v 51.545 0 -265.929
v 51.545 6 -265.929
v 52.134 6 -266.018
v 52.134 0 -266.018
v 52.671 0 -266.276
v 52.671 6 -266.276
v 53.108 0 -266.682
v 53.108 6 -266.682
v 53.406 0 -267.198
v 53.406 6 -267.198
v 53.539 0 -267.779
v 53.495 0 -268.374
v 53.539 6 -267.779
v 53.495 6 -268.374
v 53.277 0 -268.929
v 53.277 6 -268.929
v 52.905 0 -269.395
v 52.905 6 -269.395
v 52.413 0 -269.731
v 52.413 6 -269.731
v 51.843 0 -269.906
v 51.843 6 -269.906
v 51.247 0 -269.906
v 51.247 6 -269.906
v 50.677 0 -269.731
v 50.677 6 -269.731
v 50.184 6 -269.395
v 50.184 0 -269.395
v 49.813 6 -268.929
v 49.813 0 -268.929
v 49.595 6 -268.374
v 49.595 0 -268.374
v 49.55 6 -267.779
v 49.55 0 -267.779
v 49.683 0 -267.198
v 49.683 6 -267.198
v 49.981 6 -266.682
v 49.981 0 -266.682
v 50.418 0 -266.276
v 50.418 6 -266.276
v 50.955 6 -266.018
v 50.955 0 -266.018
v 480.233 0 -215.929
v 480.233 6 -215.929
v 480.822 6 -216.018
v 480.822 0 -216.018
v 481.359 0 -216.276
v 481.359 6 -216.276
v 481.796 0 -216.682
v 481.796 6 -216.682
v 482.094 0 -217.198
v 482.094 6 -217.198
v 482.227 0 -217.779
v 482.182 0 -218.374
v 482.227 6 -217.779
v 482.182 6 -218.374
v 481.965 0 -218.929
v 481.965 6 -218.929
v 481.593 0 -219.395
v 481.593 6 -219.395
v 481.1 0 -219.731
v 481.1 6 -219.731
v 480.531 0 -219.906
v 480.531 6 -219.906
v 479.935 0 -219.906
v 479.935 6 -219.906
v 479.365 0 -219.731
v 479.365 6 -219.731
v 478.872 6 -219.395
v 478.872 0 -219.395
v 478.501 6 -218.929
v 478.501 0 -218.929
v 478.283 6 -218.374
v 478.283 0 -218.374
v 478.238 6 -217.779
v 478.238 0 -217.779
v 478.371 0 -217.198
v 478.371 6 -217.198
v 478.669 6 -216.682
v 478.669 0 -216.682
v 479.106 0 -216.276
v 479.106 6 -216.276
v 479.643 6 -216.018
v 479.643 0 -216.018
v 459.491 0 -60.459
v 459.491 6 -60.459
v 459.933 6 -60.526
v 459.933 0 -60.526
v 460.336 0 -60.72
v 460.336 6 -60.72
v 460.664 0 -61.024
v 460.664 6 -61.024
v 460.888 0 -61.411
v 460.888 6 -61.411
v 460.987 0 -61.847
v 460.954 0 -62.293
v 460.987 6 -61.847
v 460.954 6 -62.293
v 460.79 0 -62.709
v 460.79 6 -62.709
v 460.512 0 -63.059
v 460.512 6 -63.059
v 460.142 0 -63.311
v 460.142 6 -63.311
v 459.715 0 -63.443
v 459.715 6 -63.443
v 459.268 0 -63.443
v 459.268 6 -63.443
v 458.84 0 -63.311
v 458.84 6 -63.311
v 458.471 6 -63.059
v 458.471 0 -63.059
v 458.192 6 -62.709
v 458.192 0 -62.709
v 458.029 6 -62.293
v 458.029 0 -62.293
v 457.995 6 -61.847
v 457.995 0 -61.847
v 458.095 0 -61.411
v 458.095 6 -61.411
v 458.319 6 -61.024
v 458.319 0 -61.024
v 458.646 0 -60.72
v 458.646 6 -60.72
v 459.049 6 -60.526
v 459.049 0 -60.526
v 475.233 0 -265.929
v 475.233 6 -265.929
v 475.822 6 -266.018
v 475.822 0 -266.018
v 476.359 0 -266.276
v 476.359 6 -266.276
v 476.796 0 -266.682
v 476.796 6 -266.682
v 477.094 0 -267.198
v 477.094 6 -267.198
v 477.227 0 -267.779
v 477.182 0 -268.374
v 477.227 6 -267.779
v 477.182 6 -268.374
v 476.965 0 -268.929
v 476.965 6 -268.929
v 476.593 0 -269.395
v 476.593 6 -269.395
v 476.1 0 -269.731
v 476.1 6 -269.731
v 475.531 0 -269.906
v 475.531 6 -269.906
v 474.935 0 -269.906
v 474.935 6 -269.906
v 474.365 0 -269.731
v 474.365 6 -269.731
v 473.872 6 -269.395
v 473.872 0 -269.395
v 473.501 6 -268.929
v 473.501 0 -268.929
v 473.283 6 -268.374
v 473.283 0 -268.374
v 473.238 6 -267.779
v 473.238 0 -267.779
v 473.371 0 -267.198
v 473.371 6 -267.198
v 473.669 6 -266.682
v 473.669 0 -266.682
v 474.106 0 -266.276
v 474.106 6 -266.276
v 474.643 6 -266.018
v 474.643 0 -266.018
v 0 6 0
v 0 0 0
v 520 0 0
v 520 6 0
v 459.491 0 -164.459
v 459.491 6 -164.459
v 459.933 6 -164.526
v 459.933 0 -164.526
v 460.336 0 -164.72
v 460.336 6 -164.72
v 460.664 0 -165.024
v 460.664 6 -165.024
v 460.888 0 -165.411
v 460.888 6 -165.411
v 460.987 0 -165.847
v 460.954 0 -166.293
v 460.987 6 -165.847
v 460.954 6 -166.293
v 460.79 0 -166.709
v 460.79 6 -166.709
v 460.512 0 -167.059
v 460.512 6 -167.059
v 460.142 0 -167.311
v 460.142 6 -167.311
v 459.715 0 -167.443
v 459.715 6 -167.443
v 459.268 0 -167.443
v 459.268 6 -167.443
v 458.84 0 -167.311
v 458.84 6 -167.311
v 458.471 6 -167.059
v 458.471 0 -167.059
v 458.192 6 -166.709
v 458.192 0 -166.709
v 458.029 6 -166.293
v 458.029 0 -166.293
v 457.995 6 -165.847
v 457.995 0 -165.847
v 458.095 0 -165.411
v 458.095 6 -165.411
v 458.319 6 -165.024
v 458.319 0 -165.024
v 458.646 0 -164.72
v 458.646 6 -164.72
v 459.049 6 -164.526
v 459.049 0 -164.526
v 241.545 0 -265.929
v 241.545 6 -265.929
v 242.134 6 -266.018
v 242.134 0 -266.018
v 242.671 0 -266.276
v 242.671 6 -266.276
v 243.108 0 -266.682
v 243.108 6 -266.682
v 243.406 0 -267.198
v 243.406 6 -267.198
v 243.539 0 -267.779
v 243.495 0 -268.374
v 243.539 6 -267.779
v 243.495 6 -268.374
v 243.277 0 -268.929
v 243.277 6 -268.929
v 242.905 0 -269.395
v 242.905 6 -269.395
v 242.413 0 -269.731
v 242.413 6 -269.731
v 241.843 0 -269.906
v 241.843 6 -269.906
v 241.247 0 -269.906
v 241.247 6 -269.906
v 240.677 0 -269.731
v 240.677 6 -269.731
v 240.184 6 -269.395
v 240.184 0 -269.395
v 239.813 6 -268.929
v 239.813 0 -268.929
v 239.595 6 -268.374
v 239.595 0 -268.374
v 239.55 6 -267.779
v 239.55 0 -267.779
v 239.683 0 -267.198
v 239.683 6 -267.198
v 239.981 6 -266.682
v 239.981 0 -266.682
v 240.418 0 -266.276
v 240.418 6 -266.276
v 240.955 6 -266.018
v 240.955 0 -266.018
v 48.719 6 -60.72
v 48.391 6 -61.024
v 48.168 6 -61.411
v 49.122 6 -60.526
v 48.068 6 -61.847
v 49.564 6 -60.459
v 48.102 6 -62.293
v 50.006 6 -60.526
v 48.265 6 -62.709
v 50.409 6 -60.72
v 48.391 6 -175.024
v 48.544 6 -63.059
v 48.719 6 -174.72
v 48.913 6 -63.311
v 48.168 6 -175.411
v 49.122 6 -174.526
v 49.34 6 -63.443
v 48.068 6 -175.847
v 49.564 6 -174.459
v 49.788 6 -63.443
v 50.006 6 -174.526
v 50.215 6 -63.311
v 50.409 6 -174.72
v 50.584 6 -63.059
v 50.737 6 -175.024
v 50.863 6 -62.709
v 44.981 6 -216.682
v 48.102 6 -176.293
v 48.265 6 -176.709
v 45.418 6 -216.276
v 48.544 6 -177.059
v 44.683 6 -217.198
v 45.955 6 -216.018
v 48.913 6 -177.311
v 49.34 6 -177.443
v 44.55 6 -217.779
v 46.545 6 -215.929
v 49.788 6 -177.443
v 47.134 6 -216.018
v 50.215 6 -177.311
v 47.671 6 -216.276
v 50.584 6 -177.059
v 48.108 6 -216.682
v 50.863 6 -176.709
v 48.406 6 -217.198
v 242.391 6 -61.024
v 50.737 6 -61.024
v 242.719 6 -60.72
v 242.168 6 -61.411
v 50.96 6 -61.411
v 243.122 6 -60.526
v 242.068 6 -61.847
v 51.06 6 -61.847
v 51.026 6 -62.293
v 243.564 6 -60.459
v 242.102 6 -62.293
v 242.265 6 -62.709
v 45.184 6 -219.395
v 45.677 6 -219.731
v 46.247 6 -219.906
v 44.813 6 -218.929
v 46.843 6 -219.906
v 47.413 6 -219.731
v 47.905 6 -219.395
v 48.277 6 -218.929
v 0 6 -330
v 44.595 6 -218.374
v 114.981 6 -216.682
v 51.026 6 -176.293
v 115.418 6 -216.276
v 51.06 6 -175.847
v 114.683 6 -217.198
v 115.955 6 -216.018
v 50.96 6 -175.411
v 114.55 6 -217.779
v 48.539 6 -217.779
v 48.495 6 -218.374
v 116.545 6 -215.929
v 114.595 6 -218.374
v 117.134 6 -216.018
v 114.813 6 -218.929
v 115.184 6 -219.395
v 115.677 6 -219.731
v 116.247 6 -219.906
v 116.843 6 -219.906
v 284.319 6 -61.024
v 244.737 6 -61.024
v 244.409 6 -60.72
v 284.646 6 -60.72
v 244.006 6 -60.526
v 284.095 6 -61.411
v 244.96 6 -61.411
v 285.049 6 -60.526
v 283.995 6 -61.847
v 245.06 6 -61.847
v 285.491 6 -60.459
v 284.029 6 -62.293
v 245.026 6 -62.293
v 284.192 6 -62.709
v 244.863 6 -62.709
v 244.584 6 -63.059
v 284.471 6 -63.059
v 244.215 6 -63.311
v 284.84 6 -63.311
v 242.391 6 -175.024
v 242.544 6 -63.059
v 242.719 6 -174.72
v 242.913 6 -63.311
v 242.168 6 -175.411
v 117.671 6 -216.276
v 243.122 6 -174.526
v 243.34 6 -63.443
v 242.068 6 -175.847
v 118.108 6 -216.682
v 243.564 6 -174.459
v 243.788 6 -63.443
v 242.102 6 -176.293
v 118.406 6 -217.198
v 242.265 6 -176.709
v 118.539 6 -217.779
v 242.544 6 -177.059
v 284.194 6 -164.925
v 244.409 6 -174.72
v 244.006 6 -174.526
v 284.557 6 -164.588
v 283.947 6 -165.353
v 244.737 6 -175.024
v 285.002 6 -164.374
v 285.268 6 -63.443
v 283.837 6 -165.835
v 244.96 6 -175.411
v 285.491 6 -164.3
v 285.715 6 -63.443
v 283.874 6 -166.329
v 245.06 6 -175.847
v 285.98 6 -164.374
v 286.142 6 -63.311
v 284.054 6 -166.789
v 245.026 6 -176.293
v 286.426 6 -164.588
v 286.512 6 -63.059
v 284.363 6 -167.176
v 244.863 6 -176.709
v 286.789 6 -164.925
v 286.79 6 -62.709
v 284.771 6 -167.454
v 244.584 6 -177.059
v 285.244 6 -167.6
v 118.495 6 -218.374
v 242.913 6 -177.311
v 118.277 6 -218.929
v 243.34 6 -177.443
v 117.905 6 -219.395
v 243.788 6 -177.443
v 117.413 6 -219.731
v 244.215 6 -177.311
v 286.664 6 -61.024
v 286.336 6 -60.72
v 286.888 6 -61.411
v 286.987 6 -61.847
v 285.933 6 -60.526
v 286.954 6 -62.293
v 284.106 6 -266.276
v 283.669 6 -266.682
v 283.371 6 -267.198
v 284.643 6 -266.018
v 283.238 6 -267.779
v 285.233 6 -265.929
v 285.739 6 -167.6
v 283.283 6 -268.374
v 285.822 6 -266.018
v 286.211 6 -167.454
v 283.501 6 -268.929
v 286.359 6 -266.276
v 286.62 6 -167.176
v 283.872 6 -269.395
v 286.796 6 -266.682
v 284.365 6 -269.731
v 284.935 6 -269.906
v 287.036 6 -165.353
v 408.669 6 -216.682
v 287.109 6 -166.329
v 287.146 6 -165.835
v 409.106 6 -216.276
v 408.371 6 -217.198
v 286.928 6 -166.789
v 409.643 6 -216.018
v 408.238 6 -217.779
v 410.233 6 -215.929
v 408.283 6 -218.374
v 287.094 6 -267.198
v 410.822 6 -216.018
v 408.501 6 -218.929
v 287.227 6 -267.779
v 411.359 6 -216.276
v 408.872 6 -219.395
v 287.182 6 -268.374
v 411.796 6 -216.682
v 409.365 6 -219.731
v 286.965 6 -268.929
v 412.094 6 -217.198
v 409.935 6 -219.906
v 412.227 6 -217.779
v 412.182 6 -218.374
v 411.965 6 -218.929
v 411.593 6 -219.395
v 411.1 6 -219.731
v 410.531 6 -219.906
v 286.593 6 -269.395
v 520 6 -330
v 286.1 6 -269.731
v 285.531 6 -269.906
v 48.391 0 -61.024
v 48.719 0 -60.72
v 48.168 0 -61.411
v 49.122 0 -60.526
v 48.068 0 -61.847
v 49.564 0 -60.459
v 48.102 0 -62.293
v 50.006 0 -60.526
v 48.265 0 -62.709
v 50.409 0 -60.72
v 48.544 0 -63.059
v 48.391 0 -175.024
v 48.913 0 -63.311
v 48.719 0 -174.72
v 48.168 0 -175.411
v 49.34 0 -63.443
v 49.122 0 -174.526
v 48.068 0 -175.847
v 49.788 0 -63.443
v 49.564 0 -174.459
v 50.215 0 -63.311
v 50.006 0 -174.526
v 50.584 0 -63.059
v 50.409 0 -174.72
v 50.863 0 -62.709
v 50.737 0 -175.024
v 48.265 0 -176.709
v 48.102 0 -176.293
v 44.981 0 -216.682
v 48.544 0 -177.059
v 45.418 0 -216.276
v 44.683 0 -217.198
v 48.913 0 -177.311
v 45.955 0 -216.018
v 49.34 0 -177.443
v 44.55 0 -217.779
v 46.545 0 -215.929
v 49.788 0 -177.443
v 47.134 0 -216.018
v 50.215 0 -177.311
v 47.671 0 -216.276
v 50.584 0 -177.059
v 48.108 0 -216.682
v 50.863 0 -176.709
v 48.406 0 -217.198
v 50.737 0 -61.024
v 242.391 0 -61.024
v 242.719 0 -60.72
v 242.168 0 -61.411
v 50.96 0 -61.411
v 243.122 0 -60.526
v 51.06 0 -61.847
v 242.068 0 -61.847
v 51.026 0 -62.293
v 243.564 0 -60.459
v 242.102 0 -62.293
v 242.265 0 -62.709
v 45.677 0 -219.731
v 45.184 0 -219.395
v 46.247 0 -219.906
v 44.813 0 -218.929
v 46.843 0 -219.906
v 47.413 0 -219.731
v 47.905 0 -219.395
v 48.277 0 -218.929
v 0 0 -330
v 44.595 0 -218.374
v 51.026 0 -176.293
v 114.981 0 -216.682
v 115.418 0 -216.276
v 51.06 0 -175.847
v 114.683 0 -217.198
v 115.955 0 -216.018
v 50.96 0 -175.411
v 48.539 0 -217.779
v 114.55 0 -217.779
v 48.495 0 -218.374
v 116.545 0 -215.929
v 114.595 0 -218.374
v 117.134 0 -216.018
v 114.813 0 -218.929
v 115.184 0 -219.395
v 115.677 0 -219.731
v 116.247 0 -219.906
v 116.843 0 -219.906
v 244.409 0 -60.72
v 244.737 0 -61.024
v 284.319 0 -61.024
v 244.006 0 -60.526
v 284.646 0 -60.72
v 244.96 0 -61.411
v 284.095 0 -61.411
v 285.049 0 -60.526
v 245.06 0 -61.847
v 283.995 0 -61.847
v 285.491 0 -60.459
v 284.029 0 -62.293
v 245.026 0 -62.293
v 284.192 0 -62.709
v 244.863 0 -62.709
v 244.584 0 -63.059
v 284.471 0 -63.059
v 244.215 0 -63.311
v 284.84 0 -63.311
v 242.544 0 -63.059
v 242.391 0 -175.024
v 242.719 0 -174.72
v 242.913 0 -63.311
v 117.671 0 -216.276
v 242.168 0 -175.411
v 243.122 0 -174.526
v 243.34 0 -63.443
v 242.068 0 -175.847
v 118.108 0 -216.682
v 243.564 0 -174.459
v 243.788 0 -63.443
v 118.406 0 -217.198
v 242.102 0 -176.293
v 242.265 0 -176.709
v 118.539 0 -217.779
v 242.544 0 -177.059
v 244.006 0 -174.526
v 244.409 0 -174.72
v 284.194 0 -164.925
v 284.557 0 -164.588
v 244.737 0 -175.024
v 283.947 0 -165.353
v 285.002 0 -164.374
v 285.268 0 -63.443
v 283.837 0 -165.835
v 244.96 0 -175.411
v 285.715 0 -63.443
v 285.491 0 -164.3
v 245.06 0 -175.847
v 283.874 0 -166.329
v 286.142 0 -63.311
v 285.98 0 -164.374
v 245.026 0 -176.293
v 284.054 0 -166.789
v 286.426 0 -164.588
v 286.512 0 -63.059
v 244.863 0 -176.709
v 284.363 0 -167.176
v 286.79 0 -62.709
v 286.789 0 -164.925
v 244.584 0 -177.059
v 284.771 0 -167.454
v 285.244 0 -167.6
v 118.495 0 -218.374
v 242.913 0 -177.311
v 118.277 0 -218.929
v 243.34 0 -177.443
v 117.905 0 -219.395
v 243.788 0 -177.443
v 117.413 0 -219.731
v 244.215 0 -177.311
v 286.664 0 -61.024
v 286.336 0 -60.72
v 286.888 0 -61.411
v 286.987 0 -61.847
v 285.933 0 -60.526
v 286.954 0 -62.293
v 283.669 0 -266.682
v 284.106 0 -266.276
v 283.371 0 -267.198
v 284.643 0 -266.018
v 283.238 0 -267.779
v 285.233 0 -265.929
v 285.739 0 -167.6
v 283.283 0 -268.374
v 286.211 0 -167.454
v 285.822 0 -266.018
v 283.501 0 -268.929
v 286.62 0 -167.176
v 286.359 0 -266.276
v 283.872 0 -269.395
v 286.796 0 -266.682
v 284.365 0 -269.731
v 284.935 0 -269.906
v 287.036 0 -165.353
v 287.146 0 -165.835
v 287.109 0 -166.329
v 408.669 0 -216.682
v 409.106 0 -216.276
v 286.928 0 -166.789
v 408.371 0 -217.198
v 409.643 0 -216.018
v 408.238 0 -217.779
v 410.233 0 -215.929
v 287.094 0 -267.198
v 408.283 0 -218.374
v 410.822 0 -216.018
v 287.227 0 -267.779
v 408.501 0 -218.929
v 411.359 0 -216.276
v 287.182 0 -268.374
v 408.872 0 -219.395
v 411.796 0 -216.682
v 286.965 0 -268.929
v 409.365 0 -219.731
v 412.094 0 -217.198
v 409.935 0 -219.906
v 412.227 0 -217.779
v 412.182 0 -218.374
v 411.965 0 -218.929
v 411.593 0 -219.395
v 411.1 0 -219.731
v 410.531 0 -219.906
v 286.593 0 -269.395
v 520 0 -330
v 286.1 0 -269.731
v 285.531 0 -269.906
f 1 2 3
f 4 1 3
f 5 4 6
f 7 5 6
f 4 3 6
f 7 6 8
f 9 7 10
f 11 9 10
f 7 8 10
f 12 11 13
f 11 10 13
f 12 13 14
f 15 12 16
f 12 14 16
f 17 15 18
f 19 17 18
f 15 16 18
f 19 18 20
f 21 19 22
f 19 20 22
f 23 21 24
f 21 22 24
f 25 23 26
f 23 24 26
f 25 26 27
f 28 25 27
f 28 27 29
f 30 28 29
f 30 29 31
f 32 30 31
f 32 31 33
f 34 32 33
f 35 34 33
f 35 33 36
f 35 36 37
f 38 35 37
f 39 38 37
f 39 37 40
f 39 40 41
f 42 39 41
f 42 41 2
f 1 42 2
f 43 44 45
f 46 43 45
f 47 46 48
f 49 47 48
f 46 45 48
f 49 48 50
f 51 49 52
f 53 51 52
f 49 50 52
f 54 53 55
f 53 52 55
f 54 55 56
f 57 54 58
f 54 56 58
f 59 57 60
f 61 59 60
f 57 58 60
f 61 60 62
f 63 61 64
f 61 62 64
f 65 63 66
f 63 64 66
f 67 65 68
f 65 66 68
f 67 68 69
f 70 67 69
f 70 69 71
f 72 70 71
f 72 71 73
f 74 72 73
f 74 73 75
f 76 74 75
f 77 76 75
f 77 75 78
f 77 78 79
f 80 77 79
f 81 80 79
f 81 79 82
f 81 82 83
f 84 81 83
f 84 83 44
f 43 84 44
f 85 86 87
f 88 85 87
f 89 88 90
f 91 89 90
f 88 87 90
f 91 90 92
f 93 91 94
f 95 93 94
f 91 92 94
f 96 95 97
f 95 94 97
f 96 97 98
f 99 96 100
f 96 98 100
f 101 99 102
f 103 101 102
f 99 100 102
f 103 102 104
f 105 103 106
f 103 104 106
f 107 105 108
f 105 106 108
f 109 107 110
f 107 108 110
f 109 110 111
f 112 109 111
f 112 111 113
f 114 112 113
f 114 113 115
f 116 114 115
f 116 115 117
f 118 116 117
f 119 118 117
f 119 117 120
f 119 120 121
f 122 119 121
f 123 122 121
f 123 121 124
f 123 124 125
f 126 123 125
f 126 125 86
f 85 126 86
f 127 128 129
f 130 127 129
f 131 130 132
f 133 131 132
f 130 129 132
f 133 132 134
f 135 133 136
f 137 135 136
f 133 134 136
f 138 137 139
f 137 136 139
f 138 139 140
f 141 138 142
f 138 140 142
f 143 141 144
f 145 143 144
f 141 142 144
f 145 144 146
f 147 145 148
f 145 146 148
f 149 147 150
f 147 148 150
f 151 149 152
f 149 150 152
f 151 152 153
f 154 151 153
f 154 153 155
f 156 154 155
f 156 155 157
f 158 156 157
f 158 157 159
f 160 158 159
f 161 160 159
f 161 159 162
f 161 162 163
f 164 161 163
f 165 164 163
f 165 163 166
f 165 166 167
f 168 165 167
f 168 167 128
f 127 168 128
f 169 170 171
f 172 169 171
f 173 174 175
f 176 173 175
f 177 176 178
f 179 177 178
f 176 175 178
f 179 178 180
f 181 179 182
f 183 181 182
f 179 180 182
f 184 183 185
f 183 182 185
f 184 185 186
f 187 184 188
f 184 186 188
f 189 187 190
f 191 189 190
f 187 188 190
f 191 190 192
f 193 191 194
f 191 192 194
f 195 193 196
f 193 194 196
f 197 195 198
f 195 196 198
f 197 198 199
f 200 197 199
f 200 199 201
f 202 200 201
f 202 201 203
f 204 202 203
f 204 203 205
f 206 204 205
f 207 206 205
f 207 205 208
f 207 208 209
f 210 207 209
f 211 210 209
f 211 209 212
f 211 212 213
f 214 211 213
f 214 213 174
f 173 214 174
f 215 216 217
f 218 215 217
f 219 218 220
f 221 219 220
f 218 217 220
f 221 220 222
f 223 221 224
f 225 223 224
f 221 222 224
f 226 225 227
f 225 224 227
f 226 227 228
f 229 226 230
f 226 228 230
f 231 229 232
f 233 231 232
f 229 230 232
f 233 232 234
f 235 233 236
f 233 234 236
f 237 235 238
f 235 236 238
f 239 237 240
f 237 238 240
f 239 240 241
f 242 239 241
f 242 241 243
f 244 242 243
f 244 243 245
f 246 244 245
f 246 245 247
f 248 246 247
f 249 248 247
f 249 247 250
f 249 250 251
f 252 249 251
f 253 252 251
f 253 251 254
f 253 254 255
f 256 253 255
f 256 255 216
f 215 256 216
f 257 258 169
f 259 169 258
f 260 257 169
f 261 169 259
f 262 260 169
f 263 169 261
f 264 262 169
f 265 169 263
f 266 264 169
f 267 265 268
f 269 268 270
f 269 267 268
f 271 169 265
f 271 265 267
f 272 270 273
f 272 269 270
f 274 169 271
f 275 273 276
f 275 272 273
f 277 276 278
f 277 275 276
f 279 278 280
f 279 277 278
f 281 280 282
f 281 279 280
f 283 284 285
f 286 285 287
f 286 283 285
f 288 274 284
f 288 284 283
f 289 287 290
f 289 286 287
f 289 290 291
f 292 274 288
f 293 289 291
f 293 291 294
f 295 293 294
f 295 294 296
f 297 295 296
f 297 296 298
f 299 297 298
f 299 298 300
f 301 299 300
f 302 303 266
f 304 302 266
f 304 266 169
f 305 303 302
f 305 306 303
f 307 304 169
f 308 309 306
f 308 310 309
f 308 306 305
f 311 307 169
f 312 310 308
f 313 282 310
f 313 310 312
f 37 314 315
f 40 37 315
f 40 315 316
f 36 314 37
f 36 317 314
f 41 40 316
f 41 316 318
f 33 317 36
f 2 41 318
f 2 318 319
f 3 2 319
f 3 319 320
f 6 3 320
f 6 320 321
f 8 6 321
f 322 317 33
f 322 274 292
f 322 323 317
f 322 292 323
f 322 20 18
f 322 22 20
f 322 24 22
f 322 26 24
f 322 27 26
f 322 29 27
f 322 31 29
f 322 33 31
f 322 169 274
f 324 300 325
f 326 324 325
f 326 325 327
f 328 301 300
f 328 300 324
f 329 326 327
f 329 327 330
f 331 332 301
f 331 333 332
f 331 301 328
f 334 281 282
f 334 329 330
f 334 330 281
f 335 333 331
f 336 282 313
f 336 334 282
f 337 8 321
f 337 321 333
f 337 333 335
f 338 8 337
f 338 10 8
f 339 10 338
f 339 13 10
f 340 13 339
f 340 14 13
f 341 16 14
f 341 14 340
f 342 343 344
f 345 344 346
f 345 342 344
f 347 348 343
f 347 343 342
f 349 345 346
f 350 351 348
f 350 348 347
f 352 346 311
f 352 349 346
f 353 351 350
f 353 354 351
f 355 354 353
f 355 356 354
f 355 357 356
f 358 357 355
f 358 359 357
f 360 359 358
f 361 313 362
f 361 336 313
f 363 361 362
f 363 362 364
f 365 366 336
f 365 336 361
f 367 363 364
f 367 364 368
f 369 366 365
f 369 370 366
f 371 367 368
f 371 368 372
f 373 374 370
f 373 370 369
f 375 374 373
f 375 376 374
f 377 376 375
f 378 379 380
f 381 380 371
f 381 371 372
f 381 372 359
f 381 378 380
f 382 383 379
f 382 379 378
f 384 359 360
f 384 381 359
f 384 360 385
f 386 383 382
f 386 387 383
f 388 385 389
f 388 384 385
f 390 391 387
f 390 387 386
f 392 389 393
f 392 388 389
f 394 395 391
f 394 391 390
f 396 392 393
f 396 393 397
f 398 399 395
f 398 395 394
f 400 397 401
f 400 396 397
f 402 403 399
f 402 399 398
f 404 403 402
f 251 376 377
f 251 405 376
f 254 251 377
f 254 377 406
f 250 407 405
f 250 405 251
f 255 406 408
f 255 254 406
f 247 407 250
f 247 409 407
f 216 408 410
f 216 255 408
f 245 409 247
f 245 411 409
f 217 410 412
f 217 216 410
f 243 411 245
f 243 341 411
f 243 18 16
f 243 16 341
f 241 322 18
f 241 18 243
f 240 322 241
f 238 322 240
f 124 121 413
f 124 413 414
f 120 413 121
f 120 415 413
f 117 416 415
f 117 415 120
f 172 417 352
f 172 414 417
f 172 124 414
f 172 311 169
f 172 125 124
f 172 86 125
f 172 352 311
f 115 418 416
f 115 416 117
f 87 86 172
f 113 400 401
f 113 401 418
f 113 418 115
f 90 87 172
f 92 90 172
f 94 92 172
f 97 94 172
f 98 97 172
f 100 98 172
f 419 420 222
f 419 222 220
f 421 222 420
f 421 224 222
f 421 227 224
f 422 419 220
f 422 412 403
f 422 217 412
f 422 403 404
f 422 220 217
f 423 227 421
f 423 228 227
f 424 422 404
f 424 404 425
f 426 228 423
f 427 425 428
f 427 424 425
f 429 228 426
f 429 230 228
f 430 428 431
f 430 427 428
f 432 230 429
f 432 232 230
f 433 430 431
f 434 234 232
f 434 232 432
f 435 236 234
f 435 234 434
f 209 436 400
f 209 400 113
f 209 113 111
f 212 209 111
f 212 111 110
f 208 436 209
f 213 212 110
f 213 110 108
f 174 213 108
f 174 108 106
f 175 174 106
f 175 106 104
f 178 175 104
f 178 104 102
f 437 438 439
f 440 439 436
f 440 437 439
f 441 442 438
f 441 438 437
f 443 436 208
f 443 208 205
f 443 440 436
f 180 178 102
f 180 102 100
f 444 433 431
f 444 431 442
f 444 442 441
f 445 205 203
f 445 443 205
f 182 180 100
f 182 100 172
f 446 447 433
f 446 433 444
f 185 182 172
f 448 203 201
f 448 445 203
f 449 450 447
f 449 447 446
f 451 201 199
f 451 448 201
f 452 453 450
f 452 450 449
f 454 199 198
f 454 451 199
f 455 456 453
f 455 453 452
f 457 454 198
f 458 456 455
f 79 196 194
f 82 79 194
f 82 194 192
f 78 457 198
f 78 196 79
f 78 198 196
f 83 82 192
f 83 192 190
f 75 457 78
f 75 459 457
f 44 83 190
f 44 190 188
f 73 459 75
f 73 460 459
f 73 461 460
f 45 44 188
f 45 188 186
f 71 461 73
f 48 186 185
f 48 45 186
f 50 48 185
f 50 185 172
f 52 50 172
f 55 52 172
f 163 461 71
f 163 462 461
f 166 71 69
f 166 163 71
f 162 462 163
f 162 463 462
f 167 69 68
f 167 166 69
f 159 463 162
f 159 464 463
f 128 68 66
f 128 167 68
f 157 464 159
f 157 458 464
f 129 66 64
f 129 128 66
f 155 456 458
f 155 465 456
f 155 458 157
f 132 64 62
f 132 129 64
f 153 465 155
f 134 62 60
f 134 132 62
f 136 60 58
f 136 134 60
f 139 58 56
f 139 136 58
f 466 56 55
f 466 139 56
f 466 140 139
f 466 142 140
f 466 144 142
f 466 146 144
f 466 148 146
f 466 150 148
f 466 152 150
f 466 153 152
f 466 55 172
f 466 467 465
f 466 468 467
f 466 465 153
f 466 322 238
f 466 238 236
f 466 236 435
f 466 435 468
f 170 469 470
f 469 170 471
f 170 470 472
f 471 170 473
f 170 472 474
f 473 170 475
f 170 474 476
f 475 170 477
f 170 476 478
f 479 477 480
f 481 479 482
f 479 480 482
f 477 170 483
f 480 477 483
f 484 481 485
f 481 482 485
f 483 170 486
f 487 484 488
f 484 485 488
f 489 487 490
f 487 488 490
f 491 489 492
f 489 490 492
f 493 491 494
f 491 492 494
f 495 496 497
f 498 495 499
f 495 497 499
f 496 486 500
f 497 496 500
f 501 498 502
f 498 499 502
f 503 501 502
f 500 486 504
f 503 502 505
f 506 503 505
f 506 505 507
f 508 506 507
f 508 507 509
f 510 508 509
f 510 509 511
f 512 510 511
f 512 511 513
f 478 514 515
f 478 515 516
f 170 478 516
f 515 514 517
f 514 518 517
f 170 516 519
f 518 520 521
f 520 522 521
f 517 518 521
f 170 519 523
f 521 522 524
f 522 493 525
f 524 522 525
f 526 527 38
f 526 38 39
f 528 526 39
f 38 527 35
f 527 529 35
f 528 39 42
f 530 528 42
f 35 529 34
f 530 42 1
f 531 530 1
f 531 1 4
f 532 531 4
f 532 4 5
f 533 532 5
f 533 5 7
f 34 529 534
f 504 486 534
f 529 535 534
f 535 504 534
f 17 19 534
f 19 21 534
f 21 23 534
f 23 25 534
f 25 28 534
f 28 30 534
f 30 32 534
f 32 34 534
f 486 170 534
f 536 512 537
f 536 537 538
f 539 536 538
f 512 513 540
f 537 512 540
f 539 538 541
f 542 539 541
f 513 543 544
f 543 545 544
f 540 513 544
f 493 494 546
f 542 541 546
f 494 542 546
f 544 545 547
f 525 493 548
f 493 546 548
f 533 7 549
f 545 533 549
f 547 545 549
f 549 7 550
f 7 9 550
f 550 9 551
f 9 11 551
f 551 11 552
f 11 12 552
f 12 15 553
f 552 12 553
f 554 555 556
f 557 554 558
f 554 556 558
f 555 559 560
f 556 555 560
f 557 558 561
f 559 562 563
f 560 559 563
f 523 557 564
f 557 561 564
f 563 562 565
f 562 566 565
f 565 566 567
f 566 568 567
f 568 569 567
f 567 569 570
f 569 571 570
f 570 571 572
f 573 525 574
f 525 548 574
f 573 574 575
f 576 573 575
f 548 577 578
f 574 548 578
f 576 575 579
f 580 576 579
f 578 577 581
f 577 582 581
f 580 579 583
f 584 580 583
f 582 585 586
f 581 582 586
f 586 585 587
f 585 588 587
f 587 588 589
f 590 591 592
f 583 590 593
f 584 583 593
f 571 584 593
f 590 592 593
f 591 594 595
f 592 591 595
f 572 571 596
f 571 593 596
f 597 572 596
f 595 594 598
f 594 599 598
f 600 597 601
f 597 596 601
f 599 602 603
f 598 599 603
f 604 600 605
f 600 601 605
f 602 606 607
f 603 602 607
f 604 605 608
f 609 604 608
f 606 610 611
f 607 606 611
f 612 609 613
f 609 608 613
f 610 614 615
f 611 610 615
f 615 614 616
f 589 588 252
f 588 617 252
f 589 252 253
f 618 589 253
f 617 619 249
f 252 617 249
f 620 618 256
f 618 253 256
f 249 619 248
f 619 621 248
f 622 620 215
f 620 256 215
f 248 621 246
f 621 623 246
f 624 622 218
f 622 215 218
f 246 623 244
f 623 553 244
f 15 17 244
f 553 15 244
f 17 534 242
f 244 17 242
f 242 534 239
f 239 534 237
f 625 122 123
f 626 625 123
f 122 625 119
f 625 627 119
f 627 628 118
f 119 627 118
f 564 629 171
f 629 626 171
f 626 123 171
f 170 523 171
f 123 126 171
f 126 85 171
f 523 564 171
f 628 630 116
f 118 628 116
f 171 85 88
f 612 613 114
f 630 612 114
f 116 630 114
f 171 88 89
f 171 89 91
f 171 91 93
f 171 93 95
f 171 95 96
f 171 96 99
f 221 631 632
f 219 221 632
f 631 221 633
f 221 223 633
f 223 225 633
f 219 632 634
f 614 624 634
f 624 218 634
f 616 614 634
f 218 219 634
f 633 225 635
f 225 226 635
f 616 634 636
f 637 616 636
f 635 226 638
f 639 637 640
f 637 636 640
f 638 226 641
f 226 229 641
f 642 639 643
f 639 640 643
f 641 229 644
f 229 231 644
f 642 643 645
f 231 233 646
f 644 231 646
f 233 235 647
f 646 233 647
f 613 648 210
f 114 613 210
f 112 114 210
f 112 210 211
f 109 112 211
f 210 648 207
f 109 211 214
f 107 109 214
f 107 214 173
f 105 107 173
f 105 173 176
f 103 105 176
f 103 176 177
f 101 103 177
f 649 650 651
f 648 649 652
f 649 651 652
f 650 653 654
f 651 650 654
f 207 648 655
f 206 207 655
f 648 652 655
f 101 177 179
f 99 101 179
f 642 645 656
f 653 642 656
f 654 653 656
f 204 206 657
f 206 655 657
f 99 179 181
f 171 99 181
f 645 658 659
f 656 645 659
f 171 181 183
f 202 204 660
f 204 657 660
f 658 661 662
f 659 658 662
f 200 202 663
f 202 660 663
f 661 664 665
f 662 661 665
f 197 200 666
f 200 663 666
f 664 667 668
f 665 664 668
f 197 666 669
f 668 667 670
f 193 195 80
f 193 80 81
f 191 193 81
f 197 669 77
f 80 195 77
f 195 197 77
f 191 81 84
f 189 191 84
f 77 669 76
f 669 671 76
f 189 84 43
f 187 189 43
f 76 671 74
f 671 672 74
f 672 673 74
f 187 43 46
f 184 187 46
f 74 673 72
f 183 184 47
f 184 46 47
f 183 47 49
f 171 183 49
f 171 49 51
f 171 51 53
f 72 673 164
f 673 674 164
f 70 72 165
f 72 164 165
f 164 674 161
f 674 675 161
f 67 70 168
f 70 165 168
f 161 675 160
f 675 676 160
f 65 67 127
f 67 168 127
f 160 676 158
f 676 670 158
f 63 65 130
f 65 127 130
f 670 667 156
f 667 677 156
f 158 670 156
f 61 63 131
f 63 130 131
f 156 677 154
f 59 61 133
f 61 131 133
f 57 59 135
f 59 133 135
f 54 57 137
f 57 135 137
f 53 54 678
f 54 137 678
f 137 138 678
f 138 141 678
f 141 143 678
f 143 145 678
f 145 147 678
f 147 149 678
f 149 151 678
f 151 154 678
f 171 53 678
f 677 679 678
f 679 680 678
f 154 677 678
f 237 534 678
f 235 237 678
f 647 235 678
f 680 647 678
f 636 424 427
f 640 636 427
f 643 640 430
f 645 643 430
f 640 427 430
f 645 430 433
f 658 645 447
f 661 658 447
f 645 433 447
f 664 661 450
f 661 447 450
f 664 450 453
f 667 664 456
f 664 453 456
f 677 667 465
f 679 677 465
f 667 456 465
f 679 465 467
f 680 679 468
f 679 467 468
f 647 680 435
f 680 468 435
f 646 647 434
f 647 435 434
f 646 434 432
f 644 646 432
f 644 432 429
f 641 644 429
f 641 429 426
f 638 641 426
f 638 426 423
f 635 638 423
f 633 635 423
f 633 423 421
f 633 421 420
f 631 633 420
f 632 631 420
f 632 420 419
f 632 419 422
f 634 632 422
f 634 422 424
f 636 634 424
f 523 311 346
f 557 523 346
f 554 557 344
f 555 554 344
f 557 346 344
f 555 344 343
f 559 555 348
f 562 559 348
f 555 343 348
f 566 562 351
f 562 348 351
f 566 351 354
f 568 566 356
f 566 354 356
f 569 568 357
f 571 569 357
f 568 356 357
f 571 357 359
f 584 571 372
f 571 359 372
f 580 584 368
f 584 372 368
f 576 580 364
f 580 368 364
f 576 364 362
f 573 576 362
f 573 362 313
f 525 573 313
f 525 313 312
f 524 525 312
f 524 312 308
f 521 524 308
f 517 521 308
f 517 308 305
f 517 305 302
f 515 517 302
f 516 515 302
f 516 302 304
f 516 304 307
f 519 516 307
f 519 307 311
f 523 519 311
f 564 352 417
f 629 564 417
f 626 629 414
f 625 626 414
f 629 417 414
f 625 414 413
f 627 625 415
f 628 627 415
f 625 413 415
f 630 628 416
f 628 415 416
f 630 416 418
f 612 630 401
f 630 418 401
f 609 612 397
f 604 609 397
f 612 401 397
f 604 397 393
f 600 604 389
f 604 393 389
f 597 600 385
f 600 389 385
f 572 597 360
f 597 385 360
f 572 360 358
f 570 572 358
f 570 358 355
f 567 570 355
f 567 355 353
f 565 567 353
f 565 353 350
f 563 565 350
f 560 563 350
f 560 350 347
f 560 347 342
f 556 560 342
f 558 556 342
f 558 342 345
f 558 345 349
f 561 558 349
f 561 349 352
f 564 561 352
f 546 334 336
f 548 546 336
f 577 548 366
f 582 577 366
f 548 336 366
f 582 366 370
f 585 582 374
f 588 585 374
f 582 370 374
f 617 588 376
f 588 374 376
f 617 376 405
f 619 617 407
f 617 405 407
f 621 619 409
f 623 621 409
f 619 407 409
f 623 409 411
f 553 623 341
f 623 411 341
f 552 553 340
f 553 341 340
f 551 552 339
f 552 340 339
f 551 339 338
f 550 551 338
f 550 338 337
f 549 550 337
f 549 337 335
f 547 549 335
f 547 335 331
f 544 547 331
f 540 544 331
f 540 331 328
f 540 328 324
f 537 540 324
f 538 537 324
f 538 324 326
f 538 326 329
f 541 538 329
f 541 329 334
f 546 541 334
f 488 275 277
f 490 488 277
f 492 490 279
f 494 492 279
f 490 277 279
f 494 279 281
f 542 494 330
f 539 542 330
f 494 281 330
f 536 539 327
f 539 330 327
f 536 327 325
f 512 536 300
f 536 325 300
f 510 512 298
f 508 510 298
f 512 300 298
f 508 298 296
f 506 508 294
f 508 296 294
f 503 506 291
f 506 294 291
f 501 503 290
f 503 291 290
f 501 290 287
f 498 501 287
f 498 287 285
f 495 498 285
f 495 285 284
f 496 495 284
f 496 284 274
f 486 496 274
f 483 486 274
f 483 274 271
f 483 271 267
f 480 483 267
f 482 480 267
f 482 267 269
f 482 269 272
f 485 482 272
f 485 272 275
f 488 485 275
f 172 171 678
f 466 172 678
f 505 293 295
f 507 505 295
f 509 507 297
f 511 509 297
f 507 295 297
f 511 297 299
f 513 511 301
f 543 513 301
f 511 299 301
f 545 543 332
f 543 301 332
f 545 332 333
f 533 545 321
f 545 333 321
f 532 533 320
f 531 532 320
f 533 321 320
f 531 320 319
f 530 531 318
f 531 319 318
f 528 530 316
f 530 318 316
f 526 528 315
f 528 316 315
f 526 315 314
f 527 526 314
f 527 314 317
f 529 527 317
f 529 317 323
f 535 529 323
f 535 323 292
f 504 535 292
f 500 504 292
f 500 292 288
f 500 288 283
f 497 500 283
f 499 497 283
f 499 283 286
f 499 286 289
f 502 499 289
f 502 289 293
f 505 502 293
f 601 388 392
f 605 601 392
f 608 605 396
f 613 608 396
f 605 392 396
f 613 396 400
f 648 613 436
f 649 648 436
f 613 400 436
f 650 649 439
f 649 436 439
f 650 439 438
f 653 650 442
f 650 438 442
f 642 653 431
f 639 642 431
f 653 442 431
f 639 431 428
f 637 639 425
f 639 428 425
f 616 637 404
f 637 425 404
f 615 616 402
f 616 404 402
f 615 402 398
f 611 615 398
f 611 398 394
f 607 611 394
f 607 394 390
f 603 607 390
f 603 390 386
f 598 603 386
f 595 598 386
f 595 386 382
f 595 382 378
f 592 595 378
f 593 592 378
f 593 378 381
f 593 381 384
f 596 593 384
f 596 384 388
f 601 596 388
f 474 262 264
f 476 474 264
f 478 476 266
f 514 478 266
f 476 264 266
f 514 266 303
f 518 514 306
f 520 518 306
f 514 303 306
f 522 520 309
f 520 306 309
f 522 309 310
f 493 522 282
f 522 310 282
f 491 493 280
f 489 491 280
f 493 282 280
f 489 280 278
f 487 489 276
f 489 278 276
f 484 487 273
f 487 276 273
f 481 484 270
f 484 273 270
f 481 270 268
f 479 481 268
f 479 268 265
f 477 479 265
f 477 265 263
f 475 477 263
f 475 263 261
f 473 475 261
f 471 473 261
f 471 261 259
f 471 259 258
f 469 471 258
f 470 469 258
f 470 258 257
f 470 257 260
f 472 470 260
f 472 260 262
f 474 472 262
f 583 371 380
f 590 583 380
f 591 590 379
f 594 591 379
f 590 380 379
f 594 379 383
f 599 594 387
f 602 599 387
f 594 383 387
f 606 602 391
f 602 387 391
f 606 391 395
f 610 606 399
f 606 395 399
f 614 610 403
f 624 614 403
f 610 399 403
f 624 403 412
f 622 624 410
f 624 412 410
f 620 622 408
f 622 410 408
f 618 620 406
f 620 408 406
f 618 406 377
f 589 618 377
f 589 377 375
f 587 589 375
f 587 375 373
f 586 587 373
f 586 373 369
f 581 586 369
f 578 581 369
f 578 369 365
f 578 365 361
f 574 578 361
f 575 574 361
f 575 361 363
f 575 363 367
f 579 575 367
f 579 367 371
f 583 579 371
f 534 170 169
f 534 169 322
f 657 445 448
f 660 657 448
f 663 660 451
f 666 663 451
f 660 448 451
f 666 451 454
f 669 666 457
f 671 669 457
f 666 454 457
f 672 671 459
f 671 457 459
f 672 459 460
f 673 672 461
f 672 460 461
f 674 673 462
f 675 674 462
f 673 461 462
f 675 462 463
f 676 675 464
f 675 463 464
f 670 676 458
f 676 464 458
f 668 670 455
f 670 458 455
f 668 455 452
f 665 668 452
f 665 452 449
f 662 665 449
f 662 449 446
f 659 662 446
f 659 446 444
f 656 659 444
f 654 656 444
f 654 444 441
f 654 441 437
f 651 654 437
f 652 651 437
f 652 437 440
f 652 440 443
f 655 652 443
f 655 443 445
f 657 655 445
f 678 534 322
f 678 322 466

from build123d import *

# Parameters (mm, degrees)
SKETCH1_W           = 520
SKETCH1_H           = 330
BOSS_EXTRUDE1_DEPTH = 6
SKETCH2_R           = 2
SKETCH2_R_2         = 1.5
SKETCH2_R_3         = 1.659330266
CUT_EXTRUDE1_DEPTH  = 10


with BuildPart() as part:
    # Sketch1 → Boss-Extrude1 (new body)
    with BuildSketch(Plane(origin=(0, 0, 0), x_dir=(1, 0, 0), z_dir=(0, 1, 0))):
        with Locations((260, 165)):
            Rectangle(SKETCH1_W, SKETCH1_H)
    extrude(amount=BOSS_EXTRUDE1_DEPTH)

    # Sketch2 → Cut-Extrude1 (cut)
    with BuildSketch(Plane(origin=(0, 6, 0), x_dir=(1, 0, 0), z_dir=(0, 1, 0))):
        with Locations(Location((475.232604686, 267.928656281, 0), (0, 0, 270))):
            Circle(SKETCH2_R)
        with Locations(Location((480.232604686, 217.928656281, 0), (0, 0, 270))):
            Circle(SKETCH2_R)
        with Locations(Location((410.232604686, 217.928656281, 0), (0, 0, 270))):
            Circle(SKETCH2_R)
        with Locations(Location((285.232604686, 267.928656281, 0), (0, 0, 270))):
            Circle(SKETCH2_R)
        with Locations(Location((241.544745515, 267.928656281, 0), (0, 0, 270))):
            Circle(SKETCH2_R)
        with Locations(Location((51.544745515, 267.928656281, 0), (0, 0, 270))):
            Circle(SKETCH2_R)
        with Locations(Location((46.544745515, 217.928656281, 0), (0, 0, 270))):
            Circle(SKETCH2_R)
        with Locations(Location((116.544745515, 217.928656281, 0), (0, 0, 270))):
            Circle(SKETCH2_R)
        with Locations(Location((459.491291532, 165.959366851, 0), (0, 0, 270))):
            Circle(SKETCH2_R_2)
        with Locations(Location((459.491291532, 61.959366851, 0), (0, 0, 270))):
            Circle(SKETCH2_R_2)
        with Locations(Location((285.491291532, 61.959366851, 0), (0, 0, 270))):
            Circle(SKETCH2_R_2)
        with Locations(Location((285.491291532, 165.959366851, 0), (0, 0, 270))):
            Circle(SKETCH2_R_3)
        with Locations(Location((243.56394518, 175.959366851, 0), (0, 0, 270))):
            Circle(SKETCH2_R_2)
        with Locations(Location((243.56394518, 61.959366851, 0), (0, 0, 270))):
            Circle(SKETCH2_R_2)
        with Locations(Location((49.56394518, 61.959366851, 0), (0, 0, 270))):
            Circle(SKETCH2_R_2)
        with Locations(Location((49.56394518, 175.959366851, 0), (0, 0, 270))):
            Circle(SKETCH2_R_2)
    extrude(amount=-CUT_EXTRUDE1_DEPTH, mode=Mode.SUBTRACT)


solid = part.part
